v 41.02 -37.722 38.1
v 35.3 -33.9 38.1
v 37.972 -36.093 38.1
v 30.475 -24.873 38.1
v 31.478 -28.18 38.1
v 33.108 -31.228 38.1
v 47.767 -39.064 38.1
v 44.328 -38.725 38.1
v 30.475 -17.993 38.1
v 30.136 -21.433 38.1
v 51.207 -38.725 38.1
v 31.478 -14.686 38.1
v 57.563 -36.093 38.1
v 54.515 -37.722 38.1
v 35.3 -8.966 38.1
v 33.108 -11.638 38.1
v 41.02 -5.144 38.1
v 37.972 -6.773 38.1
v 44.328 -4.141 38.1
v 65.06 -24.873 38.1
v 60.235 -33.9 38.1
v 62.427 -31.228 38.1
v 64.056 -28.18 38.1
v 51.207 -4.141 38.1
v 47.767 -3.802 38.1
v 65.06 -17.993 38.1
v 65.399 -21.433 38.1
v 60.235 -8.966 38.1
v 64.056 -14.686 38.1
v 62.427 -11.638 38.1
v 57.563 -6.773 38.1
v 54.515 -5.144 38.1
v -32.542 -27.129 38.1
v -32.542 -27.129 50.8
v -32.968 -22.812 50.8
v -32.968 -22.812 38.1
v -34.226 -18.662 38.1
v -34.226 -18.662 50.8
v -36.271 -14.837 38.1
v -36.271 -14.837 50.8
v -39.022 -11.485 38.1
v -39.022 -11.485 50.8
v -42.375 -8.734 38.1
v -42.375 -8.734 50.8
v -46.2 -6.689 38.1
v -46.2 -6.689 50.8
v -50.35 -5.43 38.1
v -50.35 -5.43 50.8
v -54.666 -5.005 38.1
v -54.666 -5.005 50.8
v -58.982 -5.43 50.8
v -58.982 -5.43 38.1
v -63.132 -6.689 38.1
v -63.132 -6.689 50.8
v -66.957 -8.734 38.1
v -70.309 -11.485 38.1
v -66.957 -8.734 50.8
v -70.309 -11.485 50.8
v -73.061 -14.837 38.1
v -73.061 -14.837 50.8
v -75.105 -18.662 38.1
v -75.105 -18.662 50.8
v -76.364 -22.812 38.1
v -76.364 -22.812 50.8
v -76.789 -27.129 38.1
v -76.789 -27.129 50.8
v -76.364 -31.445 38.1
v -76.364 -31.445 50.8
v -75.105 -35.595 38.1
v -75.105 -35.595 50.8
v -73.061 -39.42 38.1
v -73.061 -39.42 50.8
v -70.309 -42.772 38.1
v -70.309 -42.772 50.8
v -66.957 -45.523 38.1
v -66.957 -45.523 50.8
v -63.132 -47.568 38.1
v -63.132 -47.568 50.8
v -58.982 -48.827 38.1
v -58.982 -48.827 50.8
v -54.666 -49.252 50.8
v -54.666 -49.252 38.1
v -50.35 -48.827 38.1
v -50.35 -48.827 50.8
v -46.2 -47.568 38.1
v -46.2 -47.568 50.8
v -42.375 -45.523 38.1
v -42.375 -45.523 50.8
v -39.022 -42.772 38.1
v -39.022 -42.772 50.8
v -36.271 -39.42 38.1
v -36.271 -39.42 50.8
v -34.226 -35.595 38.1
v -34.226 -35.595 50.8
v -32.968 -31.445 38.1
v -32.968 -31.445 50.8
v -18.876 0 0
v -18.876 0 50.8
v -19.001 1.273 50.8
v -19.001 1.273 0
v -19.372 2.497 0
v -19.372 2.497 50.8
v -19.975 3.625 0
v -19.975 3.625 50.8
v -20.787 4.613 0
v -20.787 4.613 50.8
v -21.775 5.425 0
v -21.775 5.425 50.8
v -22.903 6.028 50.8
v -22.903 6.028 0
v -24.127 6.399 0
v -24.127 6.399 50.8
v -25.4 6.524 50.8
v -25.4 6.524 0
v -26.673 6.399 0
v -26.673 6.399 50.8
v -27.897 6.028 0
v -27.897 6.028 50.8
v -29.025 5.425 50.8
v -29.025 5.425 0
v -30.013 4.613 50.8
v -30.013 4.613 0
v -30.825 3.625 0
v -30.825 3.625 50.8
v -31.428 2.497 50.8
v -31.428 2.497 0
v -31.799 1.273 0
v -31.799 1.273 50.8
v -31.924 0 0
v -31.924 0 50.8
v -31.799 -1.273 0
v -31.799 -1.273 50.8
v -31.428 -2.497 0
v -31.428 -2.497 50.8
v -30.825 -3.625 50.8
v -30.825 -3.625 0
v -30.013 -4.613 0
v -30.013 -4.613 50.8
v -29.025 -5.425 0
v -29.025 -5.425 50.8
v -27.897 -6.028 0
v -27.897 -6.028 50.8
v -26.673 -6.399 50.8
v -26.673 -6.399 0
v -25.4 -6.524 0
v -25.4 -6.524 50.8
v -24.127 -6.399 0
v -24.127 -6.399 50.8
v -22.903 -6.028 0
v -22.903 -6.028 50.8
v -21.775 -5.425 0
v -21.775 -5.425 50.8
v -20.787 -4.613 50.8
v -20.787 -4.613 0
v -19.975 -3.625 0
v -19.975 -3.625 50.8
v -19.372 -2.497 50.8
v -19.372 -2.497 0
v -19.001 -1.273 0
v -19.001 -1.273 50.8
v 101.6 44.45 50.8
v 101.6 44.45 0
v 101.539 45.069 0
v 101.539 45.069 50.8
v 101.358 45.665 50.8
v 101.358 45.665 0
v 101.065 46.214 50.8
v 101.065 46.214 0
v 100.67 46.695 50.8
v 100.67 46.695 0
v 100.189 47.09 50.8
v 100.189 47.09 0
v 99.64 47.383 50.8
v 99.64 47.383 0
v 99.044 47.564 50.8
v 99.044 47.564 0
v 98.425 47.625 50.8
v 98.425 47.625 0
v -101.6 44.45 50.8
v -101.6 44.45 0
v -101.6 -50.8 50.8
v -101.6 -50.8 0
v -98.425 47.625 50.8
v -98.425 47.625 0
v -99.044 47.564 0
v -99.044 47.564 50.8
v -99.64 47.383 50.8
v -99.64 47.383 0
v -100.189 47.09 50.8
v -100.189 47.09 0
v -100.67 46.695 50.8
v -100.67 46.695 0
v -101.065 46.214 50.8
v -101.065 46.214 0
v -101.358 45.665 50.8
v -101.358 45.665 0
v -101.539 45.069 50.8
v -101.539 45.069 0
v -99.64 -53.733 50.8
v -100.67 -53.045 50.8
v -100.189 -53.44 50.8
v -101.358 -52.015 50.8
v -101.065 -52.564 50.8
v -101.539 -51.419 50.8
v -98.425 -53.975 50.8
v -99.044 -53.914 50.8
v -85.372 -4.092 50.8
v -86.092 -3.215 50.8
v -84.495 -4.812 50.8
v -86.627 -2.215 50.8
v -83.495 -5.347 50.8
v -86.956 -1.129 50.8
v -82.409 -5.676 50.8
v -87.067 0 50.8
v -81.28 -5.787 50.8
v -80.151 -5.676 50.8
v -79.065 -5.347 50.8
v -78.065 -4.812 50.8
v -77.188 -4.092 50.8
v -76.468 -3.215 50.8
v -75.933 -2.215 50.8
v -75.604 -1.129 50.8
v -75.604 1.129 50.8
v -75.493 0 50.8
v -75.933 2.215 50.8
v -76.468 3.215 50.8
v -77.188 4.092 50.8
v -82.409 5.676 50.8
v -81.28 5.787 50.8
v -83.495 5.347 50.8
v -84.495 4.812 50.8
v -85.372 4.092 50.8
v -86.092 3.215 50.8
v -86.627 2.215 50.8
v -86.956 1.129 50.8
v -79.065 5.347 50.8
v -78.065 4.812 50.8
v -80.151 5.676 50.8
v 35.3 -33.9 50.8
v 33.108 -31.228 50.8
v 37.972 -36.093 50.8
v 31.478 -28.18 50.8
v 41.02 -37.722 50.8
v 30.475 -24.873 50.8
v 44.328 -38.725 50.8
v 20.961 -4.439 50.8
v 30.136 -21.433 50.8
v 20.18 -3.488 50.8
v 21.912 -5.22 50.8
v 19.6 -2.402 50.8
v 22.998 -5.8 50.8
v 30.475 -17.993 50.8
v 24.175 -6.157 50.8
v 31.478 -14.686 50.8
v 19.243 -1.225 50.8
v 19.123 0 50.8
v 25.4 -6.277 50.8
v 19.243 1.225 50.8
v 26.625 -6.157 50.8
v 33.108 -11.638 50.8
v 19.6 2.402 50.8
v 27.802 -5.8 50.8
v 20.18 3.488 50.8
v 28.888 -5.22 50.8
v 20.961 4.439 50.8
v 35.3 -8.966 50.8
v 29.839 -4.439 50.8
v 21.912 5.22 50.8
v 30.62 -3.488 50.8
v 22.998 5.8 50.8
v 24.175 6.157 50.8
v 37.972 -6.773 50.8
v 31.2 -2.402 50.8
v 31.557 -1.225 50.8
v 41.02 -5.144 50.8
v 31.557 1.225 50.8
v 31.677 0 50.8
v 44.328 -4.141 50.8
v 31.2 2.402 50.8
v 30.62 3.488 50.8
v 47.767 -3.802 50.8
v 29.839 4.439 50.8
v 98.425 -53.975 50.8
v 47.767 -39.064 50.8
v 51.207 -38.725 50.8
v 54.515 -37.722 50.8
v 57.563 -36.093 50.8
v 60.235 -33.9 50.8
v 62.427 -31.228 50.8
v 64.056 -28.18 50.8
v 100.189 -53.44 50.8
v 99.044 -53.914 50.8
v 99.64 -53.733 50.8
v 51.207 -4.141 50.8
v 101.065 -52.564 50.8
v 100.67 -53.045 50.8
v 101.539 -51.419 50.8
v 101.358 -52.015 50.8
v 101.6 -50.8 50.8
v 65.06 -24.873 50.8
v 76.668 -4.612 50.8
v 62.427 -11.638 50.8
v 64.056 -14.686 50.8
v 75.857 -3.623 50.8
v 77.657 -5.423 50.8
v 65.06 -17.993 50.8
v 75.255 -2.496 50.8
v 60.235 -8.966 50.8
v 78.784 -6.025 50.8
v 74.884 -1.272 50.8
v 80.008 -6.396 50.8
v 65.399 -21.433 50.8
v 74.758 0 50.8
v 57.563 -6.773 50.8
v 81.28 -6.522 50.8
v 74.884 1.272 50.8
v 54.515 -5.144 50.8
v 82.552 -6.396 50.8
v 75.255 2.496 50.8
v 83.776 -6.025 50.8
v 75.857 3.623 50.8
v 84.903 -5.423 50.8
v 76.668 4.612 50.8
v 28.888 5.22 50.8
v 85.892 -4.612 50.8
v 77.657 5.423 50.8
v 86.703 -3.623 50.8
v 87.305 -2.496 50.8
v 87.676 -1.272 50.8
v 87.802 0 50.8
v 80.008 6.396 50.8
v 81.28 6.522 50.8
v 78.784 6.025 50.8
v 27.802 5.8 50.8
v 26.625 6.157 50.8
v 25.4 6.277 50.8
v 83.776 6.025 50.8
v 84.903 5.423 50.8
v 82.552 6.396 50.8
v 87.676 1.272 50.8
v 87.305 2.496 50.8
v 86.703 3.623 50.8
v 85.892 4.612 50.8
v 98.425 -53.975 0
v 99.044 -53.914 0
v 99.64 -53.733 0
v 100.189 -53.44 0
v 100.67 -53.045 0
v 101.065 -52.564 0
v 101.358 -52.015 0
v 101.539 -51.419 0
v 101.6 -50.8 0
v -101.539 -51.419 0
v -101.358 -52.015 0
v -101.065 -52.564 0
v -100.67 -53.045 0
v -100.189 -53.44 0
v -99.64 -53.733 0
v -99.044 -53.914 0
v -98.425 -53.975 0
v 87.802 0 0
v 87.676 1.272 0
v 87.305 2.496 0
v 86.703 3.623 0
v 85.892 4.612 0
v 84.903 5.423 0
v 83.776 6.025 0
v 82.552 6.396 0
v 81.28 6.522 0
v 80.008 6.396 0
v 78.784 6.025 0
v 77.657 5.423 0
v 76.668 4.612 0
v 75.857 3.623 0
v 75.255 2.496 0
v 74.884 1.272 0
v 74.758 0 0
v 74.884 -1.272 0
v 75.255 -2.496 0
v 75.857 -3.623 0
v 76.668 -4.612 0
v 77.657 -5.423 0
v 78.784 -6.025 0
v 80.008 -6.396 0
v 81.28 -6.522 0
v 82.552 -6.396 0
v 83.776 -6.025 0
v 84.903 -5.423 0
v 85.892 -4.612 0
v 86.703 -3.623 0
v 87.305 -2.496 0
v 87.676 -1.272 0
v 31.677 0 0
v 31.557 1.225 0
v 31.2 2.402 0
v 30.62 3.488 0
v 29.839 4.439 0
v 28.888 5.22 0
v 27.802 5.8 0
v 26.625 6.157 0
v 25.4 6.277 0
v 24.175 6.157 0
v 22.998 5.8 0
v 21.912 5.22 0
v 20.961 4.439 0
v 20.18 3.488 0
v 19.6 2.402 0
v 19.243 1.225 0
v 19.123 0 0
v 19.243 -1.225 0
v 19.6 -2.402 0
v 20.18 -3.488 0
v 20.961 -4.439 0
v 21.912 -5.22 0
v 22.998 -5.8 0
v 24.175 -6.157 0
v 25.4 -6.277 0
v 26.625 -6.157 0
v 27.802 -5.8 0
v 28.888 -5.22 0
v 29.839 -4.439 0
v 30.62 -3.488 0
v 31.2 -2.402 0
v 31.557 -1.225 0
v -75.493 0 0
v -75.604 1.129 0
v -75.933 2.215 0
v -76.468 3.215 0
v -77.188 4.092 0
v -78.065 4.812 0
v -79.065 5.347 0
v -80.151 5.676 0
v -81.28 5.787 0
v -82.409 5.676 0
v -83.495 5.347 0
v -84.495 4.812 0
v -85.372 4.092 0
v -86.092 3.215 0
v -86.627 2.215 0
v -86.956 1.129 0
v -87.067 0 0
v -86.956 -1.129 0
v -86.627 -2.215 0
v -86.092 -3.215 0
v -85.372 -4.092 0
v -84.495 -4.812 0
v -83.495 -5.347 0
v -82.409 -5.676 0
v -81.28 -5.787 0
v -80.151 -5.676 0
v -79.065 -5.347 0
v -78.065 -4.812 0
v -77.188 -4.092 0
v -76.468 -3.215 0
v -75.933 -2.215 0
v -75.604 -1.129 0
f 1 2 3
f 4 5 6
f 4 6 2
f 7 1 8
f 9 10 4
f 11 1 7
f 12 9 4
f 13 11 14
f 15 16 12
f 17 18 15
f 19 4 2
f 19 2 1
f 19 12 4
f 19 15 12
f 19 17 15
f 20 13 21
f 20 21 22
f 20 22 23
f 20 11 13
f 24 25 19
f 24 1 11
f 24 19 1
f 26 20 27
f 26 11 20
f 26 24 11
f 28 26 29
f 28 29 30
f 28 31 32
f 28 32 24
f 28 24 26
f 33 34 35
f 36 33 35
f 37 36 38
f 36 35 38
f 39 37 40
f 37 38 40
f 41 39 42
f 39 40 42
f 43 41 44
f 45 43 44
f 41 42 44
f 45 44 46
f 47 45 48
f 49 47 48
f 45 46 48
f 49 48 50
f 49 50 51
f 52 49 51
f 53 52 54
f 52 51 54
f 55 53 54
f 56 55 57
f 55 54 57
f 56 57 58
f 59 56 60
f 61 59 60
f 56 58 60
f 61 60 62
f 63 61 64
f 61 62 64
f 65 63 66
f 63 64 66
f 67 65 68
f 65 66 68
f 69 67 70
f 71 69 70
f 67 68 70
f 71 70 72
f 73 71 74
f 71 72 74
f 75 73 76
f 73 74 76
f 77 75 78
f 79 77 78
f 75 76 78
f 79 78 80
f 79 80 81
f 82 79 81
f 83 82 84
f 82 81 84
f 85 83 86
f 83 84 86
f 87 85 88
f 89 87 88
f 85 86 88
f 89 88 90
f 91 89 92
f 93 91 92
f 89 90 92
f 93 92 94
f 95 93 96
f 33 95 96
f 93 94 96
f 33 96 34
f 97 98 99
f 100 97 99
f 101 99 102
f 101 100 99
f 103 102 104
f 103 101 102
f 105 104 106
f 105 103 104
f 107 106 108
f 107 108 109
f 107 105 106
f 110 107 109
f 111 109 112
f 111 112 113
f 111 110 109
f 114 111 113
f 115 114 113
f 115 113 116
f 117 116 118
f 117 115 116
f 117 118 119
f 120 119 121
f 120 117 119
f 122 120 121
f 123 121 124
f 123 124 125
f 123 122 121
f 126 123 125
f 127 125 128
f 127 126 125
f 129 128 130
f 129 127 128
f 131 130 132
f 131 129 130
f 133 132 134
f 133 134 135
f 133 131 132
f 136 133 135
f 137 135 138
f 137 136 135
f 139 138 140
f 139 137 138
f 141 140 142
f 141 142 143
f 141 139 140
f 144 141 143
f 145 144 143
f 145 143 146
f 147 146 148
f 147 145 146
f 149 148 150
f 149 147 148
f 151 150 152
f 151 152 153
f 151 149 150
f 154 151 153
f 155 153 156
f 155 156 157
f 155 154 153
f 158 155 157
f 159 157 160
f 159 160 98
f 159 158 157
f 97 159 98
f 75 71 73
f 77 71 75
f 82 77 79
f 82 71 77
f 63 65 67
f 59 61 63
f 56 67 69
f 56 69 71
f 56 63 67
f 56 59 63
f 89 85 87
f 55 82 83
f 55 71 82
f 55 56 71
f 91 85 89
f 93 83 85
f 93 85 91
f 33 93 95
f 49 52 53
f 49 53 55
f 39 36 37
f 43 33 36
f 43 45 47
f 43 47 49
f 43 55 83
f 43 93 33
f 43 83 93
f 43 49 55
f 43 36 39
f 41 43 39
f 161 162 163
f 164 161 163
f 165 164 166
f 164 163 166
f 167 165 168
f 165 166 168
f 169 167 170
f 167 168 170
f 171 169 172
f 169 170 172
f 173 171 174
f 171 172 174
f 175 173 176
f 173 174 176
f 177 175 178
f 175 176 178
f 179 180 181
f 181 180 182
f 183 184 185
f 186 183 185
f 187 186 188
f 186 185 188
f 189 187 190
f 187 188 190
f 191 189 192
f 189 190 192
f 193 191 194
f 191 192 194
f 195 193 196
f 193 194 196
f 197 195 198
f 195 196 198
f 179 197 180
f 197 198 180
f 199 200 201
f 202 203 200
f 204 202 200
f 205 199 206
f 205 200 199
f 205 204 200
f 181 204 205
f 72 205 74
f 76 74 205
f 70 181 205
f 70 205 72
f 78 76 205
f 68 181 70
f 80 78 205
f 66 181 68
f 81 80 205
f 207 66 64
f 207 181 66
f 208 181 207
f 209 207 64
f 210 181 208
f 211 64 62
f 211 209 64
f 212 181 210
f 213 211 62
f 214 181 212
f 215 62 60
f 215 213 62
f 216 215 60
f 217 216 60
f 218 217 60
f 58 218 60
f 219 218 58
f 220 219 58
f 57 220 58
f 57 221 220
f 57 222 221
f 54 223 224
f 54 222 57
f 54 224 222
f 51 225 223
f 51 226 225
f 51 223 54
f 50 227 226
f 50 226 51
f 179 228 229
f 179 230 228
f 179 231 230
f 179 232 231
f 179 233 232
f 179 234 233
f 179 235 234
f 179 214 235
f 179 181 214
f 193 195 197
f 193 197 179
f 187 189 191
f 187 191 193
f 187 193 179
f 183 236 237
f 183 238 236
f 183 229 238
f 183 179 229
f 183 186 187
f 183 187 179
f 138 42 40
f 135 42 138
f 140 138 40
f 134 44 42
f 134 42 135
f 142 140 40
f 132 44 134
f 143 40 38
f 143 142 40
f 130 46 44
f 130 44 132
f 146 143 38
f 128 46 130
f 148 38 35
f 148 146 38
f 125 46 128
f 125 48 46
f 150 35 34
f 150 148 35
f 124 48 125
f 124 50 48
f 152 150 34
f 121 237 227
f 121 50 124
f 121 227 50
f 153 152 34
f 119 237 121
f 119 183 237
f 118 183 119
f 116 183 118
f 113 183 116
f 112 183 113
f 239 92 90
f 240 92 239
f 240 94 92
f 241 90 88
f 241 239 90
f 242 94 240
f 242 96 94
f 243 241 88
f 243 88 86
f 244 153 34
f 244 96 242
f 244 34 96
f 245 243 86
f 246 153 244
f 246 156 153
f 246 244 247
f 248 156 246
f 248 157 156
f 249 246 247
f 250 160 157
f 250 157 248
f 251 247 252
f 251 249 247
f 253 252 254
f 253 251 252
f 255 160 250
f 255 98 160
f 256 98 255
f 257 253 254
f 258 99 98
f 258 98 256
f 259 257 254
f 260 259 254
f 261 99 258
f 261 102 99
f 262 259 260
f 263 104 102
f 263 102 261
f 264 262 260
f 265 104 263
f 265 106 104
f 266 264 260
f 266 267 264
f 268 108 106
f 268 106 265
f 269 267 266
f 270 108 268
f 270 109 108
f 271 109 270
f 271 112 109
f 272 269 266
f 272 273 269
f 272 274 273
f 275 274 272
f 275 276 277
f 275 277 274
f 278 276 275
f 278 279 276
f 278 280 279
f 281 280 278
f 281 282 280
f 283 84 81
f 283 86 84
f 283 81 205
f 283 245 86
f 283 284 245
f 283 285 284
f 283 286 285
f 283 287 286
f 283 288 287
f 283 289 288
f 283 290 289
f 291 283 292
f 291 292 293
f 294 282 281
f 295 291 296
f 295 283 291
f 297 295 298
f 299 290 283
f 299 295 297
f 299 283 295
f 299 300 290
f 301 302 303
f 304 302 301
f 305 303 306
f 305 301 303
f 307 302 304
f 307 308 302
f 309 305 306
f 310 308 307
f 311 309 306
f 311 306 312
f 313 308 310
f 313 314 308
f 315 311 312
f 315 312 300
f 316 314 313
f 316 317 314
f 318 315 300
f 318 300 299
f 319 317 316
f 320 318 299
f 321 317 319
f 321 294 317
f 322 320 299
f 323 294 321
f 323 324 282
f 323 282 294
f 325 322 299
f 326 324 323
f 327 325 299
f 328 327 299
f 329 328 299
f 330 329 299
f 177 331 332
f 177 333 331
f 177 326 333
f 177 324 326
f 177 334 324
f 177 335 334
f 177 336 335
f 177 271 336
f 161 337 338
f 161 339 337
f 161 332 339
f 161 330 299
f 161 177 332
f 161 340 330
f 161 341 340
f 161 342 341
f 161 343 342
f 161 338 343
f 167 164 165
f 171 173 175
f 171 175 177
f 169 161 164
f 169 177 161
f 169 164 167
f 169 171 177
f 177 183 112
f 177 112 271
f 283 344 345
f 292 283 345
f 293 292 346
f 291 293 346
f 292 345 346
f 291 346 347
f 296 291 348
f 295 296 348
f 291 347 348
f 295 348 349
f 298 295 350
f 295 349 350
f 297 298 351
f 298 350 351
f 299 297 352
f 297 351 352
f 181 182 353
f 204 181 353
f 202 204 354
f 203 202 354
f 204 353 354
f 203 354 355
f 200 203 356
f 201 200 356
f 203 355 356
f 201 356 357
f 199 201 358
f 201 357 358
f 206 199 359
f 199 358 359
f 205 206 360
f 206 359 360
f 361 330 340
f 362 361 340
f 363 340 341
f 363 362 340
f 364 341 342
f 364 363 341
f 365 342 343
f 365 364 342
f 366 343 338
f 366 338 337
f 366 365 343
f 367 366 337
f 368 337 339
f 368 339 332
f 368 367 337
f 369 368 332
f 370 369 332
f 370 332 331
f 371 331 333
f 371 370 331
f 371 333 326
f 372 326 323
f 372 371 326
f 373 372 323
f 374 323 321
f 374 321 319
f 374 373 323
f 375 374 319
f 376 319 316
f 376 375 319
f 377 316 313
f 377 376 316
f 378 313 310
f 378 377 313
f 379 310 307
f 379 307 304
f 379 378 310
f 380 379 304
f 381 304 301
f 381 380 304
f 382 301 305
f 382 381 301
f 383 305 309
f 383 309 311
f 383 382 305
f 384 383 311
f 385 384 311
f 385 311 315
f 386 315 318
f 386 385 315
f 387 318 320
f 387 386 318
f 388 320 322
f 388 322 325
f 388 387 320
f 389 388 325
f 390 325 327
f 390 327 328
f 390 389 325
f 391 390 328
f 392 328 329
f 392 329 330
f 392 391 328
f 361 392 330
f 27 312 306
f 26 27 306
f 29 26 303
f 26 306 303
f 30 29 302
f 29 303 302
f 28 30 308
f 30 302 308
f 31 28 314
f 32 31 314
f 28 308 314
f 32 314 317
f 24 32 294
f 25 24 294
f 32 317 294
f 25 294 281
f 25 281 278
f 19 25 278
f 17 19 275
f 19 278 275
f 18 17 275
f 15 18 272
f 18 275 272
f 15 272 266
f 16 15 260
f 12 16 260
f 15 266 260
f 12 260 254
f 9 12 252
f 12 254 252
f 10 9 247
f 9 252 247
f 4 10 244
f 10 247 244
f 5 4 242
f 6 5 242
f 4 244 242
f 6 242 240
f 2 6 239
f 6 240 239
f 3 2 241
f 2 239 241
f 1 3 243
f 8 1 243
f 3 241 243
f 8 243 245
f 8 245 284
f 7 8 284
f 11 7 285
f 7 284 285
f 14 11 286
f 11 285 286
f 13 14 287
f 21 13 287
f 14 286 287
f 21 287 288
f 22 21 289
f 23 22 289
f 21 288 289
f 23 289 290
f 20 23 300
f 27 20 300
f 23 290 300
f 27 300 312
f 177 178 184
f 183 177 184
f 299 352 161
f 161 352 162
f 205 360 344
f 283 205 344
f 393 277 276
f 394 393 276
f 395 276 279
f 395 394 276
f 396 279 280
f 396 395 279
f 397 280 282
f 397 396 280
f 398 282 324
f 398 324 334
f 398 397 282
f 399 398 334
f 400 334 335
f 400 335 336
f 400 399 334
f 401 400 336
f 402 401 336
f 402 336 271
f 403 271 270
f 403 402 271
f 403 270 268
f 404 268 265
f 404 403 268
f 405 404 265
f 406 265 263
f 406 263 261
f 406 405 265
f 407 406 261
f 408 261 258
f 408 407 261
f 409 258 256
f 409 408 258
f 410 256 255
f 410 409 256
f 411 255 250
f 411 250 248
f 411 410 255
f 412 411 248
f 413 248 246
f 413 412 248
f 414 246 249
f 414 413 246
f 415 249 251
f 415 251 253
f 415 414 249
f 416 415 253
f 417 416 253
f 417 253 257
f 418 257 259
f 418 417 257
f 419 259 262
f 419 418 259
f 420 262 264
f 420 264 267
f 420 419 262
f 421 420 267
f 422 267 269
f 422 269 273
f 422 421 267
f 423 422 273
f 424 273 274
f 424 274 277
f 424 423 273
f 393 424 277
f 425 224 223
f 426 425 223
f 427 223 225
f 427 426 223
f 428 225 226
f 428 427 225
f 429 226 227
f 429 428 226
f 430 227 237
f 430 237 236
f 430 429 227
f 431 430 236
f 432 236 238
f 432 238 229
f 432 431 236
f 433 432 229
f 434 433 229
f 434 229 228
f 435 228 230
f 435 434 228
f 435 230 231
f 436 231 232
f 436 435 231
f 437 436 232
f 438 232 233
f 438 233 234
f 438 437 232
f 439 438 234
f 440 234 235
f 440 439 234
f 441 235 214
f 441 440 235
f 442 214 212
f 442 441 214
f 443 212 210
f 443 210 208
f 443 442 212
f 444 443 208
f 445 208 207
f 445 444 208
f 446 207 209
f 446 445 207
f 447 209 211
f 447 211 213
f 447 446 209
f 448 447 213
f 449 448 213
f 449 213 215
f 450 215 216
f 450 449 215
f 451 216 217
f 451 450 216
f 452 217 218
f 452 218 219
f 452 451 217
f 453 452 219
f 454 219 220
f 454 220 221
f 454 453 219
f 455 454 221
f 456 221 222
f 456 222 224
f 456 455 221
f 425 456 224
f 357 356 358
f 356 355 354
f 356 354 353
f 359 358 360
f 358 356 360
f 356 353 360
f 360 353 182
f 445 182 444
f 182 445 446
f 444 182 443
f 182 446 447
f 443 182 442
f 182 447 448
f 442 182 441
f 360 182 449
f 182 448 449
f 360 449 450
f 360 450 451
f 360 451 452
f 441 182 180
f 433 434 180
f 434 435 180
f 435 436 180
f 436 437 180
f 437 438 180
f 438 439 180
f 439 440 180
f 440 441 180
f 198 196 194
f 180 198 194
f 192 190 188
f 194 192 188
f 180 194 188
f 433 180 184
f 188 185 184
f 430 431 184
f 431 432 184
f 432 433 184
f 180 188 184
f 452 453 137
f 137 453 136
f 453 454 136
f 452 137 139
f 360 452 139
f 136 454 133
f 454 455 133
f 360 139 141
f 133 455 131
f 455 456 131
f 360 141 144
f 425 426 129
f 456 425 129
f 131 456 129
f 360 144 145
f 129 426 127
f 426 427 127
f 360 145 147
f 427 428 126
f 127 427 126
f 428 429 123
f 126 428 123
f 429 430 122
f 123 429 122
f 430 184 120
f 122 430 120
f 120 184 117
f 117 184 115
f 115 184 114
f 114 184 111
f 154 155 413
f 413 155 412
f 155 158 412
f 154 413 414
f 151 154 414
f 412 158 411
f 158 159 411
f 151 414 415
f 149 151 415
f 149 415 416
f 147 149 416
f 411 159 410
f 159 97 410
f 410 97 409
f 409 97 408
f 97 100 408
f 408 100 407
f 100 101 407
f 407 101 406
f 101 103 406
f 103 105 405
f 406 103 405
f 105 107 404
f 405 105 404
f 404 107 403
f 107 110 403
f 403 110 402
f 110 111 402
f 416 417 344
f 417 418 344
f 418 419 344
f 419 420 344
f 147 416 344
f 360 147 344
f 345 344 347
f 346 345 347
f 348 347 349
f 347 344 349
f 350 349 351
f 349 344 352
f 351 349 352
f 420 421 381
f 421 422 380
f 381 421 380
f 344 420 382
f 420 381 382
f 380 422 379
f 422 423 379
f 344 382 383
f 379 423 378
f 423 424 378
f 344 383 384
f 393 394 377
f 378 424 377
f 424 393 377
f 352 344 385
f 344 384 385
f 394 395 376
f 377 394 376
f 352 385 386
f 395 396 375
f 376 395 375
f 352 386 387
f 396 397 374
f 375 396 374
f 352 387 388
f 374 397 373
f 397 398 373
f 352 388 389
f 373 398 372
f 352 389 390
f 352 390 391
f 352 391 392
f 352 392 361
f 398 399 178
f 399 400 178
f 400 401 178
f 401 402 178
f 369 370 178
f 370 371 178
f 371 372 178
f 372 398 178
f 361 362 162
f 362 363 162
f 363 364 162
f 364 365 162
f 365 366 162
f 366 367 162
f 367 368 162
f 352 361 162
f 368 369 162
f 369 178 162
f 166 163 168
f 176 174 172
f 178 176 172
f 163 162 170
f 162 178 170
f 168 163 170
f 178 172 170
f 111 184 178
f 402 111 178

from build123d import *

# Parameters (mm, degrees)
F0_R     = 5.787016
F0_R_2   = 6.524432
F0_R_3   = 6.27749
F0_R_4   = 6.521669
F1_DEPTH = 50.8
F2_R     = 22.123373
F2_R_2   = 17.63113
F3_DEPTH = 12.7


with BuildPart() as f1:
    # F0 (on Top) → F1 (new body)
    with BuildSketch(Plane.XY):
        with BuildLine():
            ThreePointArc((-101.6, -50.8), (-100.670064, -53.045064), (-98.425, -53.975))
            Line((-98.425, -53.975), (98.425, -53.975))
            ThreePointArc((98.425, -53.975), (100.670064, -53.045064), (101.6, -50.8))
            Line((101.6, -50.8), (101.6, 44.45))
            ThreePointArc((101.6, 44.45), (100.670064, 46.695064), (98.425, 47.625))
            Line((98.425, 47.625), (-98.425, 47.625))
            ThreePointArc((-98.425, 47.625), (-100.670064, 46.695064), (-101.6, 44.45))
            Line((-101.6, 44.45), (-101.6, -50.8))
        make_face()
        with Locations((-81.28, 0)):
            Circle(F0_R, mode=Mode.SUBTRACT)
        with Locations((-25.4, 0)):
            Circle(F0_R_2, mode=Mode.SUBTRACT)
        with Locations((25.4, 0)):
            Circle(F0_R_3, mode=Mode.SUBTRACT)
        with Locations((81.28, 0)):
            Circle(F0_R_4, mode=Mode.SUBTRACT)
    extrude(amount=F1_DEPTH)

    # F2 (on face) → F3 (cut)
    with BuildSketch(Plane.XY.offset(50.8)):
        with Locations((-54.665826, -27.128531)):
            Circle(F2_R)
        with Locations((47.767427, -21.433132)):
            Circle(F2_R_2)
    extrude(amount=-F3_DEPTH, mode=Mode.SUBTRACT)


solid = f1.part
